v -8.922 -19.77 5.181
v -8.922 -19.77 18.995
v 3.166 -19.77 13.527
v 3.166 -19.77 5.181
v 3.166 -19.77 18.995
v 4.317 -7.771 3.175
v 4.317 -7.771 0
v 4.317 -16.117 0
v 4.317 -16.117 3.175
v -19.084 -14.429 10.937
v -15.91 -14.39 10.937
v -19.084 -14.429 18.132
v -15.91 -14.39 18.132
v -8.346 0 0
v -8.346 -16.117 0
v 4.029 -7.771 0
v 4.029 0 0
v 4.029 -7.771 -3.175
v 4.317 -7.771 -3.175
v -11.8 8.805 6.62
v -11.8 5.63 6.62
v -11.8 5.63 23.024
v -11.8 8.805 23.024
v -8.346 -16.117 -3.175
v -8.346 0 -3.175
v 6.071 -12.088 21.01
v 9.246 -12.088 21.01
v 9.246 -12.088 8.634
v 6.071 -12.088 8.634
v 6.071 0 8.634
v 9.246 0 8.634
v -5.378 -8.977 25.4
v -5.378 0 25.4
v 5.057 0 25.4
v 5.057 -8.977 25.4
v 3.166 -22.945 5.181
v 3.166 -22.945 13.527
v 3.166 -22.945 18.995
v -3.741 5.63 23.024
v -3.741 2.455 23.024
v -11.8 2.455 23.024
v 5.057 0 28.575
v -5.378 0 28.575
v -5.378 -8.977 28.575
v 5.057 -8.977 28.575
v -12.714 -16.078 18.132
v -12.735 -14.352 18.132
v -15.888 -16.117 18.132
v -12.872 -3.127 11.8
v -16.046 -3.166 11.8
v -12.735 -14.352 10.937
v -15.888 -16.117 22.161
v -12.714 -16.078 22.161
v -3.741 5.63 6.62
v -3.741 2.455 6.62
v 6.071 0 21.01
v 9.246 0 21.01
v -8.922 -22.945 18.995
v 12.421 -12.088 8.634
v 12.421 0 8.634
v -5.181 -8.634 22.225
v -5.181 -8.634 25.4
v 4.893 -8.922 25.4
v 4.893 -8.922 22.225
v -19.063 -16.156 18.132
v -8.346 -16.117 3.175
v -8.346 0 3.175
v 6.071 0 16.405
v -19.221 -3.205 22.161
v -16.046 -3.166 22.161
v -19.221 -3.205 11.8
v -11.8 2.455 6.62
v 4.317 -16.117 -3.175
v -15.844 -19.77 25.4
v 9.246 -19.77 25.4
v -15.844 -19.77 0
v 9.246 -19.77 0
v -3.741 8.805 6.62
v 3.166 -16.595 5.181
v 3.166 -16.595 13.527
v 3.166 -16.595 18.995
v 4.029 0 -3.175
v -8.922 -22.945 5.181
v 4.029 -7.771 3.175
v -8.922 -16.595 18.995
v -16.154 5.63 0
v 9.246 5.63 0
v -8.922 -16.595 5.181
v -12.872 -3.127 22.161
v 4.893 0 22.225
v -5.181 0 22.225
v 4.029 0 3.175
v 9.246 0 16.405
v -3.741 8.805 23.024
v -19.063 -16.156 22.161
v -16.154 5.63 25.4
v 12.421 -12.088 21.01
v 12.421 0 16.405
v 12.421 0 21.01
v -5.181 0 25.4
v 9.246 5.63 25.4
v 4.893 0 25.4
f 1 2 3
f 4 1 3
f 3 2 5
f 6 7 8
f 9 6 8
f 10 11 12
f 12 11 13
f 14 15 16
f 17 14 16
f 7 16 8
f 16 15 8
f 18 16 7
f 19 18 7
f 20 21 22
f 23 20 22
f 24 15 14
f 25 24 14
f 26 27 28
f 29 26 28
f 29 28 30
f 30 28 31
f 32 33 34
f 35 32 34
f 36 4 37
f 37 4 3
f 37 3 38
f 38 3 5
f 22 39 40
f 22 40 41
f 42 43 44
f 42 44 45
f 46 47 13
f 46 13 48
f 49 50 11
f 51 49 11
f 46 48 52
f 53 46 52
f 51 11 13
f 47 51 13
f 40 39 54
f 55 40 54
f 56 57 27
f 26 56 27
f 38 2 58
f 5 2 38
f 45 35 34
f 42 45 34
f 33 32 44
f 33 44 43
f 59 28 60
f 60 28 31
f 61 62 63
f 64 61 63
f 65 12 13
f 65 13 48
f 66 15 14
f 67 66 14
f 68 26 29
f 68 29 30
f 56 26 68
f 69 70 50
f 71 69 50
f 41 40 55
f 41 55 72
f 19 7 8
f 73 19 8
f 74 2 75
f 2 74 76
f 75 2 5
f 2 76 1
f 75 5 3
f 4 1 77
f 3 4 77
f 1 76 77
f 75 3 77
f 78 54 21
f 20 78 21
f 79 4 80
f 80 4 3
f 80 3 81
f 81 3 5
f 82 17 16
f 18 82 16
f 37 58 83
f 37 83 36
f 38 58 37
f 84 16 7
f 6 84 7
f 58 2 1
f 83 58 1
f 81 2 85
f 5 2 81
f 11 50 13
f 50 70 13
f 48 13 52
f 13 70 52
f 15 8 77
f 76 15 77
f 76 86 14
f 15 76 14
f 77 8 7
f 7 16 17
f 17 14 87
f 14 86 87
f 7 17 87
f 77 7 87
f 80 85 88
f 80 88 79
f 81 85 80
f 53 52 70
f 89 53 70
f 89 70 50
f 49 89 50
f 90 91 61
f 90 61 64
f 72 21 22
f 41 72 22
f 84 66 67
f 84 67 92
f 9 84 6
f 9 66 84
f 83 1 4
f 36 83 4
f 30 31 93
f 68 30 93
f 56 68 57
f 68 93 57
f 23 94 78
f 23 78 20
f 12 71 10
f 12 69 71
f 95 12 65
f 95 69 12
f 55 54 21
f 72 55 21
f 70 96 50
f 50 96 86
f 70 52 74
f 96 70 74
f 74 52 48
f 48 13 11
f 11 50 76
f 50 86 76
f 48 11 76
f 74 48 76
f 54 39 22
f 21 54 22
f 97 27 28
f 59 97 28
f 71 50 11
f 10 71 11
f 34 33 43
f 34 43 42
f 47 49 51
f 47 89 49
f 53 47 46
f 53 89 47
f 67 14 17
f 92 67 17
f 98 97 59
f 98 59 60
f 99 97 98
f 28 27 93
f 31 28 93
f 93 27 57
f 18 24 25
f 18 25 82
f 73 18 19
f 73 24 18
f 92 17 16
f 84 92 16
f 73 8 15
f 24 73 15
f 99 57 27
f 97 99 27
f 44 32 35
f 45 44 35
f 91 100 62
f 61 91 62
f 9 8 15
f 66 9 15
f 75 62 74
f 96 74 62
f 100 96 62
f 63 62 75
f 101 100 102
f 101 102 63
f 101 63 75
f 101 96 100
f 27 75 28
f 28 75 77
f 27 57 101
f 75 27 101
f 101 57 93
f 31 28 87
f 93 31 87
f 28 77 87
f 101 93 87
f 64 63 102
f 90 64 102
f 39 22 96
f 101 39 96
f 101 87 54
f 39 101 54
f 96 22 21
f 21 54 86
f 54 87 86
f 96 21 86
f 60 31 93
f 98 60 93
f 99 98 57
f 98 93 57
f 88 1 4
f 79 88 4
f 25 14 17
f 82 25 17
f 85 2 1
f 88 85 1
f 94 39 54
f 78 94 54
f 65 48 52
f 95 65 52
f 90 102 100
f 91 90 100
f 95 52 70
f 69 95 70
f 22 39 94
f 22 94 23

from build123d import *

# Parameters (mm, degrees)
F1_DEPTH  = 25.4
F4_DEPTH  = 3.175
F5_W      = 6.0439207591
F5_H      = 4.6048928052
F6_DEPTH  = 3.175
F7_W      = 8.0585589167
F7_H      = 7.1951448917
F7_H_2    = 9.2097851448
F8_DEPTH  = 3.175
F9_W      = 12.0878436137
F9_H      = 5.468309857
F10_DEPTH = 3.175
F11_W     = 5.6126299314
F11_H     = 4.0292795748
F11_W_2   = 1.726959832
F12_DEPTH = 3.175
F13_W     = 12.3756490648
F13_H     = 7.7707557939
F14_DEPTH = 3.175
F15_W     = 10.4352370836
F15_H     = 8.9767808095
F16_DEPTH = 3.175
F17_DEPTH = 3.175
F18_DEPTH = 3.175
F19_DEPTH = 3.175
F20_DEPTH = 3.175
F21_DEPTH = 3.175


with BuildPart() as f1:
    # F0 (on Top) → F1 (new body)
    with BuildSketch(Plane.XY):
        Polygon((9.2463303961, 5.6304850562), (-16.1536696039, 5.6304850562), (-15.8439135919, -19.7695149438), (9.2463303961, -19.7695149438), align=None)
    extrude(amount=F1_DEPTH)

    # F2 (on face) → F4 (cut)
    with BuildSketch(Plane.XY.offset(25.4)):
        Polygon((-5.1805032417, 0), (-5.1805032417, -8.63417238), (4.8926984891, -8.9219780639), (4.8926984891, 0), align=None)
    extrude(amount=-F4_DEPTH, mode=Mode.SUBTRACT)

    # F5 (on face) → F6 (cut)
    with BuildSketch(Plane.YZ.offset(9.2463303961)):
        with Locations((-9.0658811387, 18.7073750421)):
            Rectangle(F5_W, F5_H)
        Polygon((-6.0439207591, 16.4049286395), (-12.0878415182, 16.4049286395), (-12.0878415182, 8.63417238), (0, 8.63417238), (0, 16.4049286395), align=None)
        with Locations((-3.0219603796, 18.7073750421)):
            Rectangle(F5_W, F5_H)
    extrude(amount=-F6_DEPTH, mode=Mode.SUBTRACT)

    # F7 (on face) → F8 (cut)
    with BuildSketch(Plane(origin=(0, 5.6304850562, 0), x_dir=(-1, 0, 0), z_dir=(0, 1, 0))):
        with Locations((7.7707554447, 19.4268897176)):
            Rectangle(F7_W, F7_H)
        with Locations((7.7707554447, 11.2244246993)):
            Rectangle(F7_W, F7_H_2)
    extrude(amount=-F8_DEPTH, mode=Mode.SUBTRACT)

    # F9 (on face) → F10 (cut)
    with BuildSketch(Plane.XZ.offset(19.7695149438)):
        with Locations((-2.8780571884, 16.2610257976)):
            Rectangle(F9_W, F9_H)
        Polygon((3.1658646185, 13.5268708691), (-8.9219789952, 13.5268708691), (-8.9219789952, 5.1805032417), (-7.1951430291, 5.1805032417), (3.1658646185, 5.1805032417), align=None)
    extrude(amount=-F10_DEPTH, mode=Mode.SUBTRACT)

    # F11 (on face) → F12 (cut)
    with BuildSketch(Plane(origin=(-16.08261335, -0.1961293769, 0), x_dir=(0.0121942118, -0.9999256478, 0), z_dir=(-0.9999256478, -0.0121942118, 0))):
        Polygon((2.9699560255, 18.131762743), (2.9699560255, 11.8000358343), (14.1952158883, 10.9366187826), (14.1952158883, 18.131762743), (8.5825859569, 18.131762743), align=None)
        with Locations((5.7762709912, 20.1464025304)):
            Rectangle(F11_W, F11_H)
        with Locations((11.3889009226, 20.1464025304)):
            Rectangle(F11_W, F11_H)
        with Locations((15.0586958043, 20.1464025304)):
            Rectangle(F11_W_2, F11_H)
    extrude(amount=-F12_DEPTH, mode=Mode.SUBTRACT)

    # F13 (on face) → F14 (cut)
    with BuildSketch(Plane(origin=(0, 0, 0), x_dir=(1, 0, 0), z_dir=(0, 0, -1))):
        Polygon((-8.3463676274, 16.1171220243), (-8.3463676274, 7.7707557939), (4.0292814374, 7.7707557939), (4.3170871213, 7.7707557939), (4.3170871213, 16.1171220243), align=None)
        with Locations((-2.158543095, 3.8853778969)):
            Rectangle(F13_W, F13_H)
    extrude(amount=-F14_DEPTH, mode=Mode.SUBTRACT)


with BuildPart() as f16:
    # F15 (on face) → F16 (new body)
    with BuildSketch(Plane.XY.offset(25.4)):
        with Locations((-0.1602803823, -4.4883904047)):
            Rectangle(F15_W, F15_H)
    extrude(amount=F16_DEPTH)


with BuildPart() as f17:
    # F5 (on face) → F17 (new body)
    with BuildSketch(Plane.YZ.offset(9.2463303961)):
        with Locations((-9.0658811387, 18.7073750421)):
            Rectangle(F5_W, F5_H)
        Polygon((-6.0439207591, 16.4049286395), (-12.0878415182, 16.4049286395), (-12.0878415182, 8.63417238), (0, 8.63417238), (0, 16.4049286395), align=None)
        with Locations((-3.0219603796, 18.7073750421)):
            Rectangle(F5_W, F5_H)
    extrude(amount=F17_DEPTH)


with BuildPart() as f18:
    # F7 (on face) → F18 (new body)
    with BuildSketch(Plane(origin=(0, 5.6304850562, 0), x_dir=(-1, 0, 0), z_dir=(0, 1, 0))):
        with Locations((7.7707554447, 19.4268897176)):
            Rectangle(F7_W, F7_H)
        with Locations((7.7707554447, 11.2244246993)):
            Rectangle(F7_W, F7_H_2)
    extrude(amount=F18_DEPTH)


with BuildPart() as f19:
    # F11 (on face) → F19 (new body)
    with BuildSketch(Plane(origin=(-16.08261335, -0.1961293769, 0), x_dir=(0.0121942118, -0.9999256478, 0), z_dir=(-0.9999256478, -0.0121942118, 0))):
        Polygon((2.9699560255, 18.131762743), (2.9699560255, 11.8000358343), (14.1952158883, 10.9366187826), (14.1952158883, 18.131762743), (8.5825859569, 18.131762743), align=None)
        with Locations((5.7762709912, 20.1464025304)):
            Rectangle(F11_W, F11_H)
        with Locations((11.3889009226, 20.1464025304)):
            Rectangle(F11_W, F11_H)
        with Locations((15.0586958043, 20.1464025304)):
            Rectangle(F11_W_2, F11_H)
    extrude(amount=F19_DEPTH)


with BuildPart() as f20:
    # F9 (on face) → F20 (new body)
    with BuildSketch(Plane.XZ.offset(19.7695149438)):
        with Locations((-2.8780571884, 16.2610257976)):
            Rectangle(F9_W, F9_H)
        Polygon((3.1658646185, 13.5268708691), (-8.9219789952, 13.5268708691), (-8.9219789952, 5.1805032417), (-7.1951430291, 5.1805032417), (3.1658646185, 5.1805032417), align=None)
    extrude(amount=F20_DEPTH)


with BuildPart() as f21:
    # F13 (on face) → F21 (new body)
    with BuildSketch(Plane(origin=(0, 0, 0), x_dir=(1, 0, 0), z_dir=(0, 0, -1))):
        Polygon((-8.3463676274, 16.1171220243), (-8.3463676274, 7.7707557939), (4.0292814374, 7.7707557939), (4.3170871213, 7.7707557939), (4.3170871213, 16.1171220243), align=None)
        with Locations((-2.158543095, 3.8853778969)):
            Rectangle(F13_W, F13_H)
    extrude(amount=F21_DEPTH)


solid = Compound([f1.part, f16.part, f17.part, f18.part, f19.part, f20.part, f21.part])
